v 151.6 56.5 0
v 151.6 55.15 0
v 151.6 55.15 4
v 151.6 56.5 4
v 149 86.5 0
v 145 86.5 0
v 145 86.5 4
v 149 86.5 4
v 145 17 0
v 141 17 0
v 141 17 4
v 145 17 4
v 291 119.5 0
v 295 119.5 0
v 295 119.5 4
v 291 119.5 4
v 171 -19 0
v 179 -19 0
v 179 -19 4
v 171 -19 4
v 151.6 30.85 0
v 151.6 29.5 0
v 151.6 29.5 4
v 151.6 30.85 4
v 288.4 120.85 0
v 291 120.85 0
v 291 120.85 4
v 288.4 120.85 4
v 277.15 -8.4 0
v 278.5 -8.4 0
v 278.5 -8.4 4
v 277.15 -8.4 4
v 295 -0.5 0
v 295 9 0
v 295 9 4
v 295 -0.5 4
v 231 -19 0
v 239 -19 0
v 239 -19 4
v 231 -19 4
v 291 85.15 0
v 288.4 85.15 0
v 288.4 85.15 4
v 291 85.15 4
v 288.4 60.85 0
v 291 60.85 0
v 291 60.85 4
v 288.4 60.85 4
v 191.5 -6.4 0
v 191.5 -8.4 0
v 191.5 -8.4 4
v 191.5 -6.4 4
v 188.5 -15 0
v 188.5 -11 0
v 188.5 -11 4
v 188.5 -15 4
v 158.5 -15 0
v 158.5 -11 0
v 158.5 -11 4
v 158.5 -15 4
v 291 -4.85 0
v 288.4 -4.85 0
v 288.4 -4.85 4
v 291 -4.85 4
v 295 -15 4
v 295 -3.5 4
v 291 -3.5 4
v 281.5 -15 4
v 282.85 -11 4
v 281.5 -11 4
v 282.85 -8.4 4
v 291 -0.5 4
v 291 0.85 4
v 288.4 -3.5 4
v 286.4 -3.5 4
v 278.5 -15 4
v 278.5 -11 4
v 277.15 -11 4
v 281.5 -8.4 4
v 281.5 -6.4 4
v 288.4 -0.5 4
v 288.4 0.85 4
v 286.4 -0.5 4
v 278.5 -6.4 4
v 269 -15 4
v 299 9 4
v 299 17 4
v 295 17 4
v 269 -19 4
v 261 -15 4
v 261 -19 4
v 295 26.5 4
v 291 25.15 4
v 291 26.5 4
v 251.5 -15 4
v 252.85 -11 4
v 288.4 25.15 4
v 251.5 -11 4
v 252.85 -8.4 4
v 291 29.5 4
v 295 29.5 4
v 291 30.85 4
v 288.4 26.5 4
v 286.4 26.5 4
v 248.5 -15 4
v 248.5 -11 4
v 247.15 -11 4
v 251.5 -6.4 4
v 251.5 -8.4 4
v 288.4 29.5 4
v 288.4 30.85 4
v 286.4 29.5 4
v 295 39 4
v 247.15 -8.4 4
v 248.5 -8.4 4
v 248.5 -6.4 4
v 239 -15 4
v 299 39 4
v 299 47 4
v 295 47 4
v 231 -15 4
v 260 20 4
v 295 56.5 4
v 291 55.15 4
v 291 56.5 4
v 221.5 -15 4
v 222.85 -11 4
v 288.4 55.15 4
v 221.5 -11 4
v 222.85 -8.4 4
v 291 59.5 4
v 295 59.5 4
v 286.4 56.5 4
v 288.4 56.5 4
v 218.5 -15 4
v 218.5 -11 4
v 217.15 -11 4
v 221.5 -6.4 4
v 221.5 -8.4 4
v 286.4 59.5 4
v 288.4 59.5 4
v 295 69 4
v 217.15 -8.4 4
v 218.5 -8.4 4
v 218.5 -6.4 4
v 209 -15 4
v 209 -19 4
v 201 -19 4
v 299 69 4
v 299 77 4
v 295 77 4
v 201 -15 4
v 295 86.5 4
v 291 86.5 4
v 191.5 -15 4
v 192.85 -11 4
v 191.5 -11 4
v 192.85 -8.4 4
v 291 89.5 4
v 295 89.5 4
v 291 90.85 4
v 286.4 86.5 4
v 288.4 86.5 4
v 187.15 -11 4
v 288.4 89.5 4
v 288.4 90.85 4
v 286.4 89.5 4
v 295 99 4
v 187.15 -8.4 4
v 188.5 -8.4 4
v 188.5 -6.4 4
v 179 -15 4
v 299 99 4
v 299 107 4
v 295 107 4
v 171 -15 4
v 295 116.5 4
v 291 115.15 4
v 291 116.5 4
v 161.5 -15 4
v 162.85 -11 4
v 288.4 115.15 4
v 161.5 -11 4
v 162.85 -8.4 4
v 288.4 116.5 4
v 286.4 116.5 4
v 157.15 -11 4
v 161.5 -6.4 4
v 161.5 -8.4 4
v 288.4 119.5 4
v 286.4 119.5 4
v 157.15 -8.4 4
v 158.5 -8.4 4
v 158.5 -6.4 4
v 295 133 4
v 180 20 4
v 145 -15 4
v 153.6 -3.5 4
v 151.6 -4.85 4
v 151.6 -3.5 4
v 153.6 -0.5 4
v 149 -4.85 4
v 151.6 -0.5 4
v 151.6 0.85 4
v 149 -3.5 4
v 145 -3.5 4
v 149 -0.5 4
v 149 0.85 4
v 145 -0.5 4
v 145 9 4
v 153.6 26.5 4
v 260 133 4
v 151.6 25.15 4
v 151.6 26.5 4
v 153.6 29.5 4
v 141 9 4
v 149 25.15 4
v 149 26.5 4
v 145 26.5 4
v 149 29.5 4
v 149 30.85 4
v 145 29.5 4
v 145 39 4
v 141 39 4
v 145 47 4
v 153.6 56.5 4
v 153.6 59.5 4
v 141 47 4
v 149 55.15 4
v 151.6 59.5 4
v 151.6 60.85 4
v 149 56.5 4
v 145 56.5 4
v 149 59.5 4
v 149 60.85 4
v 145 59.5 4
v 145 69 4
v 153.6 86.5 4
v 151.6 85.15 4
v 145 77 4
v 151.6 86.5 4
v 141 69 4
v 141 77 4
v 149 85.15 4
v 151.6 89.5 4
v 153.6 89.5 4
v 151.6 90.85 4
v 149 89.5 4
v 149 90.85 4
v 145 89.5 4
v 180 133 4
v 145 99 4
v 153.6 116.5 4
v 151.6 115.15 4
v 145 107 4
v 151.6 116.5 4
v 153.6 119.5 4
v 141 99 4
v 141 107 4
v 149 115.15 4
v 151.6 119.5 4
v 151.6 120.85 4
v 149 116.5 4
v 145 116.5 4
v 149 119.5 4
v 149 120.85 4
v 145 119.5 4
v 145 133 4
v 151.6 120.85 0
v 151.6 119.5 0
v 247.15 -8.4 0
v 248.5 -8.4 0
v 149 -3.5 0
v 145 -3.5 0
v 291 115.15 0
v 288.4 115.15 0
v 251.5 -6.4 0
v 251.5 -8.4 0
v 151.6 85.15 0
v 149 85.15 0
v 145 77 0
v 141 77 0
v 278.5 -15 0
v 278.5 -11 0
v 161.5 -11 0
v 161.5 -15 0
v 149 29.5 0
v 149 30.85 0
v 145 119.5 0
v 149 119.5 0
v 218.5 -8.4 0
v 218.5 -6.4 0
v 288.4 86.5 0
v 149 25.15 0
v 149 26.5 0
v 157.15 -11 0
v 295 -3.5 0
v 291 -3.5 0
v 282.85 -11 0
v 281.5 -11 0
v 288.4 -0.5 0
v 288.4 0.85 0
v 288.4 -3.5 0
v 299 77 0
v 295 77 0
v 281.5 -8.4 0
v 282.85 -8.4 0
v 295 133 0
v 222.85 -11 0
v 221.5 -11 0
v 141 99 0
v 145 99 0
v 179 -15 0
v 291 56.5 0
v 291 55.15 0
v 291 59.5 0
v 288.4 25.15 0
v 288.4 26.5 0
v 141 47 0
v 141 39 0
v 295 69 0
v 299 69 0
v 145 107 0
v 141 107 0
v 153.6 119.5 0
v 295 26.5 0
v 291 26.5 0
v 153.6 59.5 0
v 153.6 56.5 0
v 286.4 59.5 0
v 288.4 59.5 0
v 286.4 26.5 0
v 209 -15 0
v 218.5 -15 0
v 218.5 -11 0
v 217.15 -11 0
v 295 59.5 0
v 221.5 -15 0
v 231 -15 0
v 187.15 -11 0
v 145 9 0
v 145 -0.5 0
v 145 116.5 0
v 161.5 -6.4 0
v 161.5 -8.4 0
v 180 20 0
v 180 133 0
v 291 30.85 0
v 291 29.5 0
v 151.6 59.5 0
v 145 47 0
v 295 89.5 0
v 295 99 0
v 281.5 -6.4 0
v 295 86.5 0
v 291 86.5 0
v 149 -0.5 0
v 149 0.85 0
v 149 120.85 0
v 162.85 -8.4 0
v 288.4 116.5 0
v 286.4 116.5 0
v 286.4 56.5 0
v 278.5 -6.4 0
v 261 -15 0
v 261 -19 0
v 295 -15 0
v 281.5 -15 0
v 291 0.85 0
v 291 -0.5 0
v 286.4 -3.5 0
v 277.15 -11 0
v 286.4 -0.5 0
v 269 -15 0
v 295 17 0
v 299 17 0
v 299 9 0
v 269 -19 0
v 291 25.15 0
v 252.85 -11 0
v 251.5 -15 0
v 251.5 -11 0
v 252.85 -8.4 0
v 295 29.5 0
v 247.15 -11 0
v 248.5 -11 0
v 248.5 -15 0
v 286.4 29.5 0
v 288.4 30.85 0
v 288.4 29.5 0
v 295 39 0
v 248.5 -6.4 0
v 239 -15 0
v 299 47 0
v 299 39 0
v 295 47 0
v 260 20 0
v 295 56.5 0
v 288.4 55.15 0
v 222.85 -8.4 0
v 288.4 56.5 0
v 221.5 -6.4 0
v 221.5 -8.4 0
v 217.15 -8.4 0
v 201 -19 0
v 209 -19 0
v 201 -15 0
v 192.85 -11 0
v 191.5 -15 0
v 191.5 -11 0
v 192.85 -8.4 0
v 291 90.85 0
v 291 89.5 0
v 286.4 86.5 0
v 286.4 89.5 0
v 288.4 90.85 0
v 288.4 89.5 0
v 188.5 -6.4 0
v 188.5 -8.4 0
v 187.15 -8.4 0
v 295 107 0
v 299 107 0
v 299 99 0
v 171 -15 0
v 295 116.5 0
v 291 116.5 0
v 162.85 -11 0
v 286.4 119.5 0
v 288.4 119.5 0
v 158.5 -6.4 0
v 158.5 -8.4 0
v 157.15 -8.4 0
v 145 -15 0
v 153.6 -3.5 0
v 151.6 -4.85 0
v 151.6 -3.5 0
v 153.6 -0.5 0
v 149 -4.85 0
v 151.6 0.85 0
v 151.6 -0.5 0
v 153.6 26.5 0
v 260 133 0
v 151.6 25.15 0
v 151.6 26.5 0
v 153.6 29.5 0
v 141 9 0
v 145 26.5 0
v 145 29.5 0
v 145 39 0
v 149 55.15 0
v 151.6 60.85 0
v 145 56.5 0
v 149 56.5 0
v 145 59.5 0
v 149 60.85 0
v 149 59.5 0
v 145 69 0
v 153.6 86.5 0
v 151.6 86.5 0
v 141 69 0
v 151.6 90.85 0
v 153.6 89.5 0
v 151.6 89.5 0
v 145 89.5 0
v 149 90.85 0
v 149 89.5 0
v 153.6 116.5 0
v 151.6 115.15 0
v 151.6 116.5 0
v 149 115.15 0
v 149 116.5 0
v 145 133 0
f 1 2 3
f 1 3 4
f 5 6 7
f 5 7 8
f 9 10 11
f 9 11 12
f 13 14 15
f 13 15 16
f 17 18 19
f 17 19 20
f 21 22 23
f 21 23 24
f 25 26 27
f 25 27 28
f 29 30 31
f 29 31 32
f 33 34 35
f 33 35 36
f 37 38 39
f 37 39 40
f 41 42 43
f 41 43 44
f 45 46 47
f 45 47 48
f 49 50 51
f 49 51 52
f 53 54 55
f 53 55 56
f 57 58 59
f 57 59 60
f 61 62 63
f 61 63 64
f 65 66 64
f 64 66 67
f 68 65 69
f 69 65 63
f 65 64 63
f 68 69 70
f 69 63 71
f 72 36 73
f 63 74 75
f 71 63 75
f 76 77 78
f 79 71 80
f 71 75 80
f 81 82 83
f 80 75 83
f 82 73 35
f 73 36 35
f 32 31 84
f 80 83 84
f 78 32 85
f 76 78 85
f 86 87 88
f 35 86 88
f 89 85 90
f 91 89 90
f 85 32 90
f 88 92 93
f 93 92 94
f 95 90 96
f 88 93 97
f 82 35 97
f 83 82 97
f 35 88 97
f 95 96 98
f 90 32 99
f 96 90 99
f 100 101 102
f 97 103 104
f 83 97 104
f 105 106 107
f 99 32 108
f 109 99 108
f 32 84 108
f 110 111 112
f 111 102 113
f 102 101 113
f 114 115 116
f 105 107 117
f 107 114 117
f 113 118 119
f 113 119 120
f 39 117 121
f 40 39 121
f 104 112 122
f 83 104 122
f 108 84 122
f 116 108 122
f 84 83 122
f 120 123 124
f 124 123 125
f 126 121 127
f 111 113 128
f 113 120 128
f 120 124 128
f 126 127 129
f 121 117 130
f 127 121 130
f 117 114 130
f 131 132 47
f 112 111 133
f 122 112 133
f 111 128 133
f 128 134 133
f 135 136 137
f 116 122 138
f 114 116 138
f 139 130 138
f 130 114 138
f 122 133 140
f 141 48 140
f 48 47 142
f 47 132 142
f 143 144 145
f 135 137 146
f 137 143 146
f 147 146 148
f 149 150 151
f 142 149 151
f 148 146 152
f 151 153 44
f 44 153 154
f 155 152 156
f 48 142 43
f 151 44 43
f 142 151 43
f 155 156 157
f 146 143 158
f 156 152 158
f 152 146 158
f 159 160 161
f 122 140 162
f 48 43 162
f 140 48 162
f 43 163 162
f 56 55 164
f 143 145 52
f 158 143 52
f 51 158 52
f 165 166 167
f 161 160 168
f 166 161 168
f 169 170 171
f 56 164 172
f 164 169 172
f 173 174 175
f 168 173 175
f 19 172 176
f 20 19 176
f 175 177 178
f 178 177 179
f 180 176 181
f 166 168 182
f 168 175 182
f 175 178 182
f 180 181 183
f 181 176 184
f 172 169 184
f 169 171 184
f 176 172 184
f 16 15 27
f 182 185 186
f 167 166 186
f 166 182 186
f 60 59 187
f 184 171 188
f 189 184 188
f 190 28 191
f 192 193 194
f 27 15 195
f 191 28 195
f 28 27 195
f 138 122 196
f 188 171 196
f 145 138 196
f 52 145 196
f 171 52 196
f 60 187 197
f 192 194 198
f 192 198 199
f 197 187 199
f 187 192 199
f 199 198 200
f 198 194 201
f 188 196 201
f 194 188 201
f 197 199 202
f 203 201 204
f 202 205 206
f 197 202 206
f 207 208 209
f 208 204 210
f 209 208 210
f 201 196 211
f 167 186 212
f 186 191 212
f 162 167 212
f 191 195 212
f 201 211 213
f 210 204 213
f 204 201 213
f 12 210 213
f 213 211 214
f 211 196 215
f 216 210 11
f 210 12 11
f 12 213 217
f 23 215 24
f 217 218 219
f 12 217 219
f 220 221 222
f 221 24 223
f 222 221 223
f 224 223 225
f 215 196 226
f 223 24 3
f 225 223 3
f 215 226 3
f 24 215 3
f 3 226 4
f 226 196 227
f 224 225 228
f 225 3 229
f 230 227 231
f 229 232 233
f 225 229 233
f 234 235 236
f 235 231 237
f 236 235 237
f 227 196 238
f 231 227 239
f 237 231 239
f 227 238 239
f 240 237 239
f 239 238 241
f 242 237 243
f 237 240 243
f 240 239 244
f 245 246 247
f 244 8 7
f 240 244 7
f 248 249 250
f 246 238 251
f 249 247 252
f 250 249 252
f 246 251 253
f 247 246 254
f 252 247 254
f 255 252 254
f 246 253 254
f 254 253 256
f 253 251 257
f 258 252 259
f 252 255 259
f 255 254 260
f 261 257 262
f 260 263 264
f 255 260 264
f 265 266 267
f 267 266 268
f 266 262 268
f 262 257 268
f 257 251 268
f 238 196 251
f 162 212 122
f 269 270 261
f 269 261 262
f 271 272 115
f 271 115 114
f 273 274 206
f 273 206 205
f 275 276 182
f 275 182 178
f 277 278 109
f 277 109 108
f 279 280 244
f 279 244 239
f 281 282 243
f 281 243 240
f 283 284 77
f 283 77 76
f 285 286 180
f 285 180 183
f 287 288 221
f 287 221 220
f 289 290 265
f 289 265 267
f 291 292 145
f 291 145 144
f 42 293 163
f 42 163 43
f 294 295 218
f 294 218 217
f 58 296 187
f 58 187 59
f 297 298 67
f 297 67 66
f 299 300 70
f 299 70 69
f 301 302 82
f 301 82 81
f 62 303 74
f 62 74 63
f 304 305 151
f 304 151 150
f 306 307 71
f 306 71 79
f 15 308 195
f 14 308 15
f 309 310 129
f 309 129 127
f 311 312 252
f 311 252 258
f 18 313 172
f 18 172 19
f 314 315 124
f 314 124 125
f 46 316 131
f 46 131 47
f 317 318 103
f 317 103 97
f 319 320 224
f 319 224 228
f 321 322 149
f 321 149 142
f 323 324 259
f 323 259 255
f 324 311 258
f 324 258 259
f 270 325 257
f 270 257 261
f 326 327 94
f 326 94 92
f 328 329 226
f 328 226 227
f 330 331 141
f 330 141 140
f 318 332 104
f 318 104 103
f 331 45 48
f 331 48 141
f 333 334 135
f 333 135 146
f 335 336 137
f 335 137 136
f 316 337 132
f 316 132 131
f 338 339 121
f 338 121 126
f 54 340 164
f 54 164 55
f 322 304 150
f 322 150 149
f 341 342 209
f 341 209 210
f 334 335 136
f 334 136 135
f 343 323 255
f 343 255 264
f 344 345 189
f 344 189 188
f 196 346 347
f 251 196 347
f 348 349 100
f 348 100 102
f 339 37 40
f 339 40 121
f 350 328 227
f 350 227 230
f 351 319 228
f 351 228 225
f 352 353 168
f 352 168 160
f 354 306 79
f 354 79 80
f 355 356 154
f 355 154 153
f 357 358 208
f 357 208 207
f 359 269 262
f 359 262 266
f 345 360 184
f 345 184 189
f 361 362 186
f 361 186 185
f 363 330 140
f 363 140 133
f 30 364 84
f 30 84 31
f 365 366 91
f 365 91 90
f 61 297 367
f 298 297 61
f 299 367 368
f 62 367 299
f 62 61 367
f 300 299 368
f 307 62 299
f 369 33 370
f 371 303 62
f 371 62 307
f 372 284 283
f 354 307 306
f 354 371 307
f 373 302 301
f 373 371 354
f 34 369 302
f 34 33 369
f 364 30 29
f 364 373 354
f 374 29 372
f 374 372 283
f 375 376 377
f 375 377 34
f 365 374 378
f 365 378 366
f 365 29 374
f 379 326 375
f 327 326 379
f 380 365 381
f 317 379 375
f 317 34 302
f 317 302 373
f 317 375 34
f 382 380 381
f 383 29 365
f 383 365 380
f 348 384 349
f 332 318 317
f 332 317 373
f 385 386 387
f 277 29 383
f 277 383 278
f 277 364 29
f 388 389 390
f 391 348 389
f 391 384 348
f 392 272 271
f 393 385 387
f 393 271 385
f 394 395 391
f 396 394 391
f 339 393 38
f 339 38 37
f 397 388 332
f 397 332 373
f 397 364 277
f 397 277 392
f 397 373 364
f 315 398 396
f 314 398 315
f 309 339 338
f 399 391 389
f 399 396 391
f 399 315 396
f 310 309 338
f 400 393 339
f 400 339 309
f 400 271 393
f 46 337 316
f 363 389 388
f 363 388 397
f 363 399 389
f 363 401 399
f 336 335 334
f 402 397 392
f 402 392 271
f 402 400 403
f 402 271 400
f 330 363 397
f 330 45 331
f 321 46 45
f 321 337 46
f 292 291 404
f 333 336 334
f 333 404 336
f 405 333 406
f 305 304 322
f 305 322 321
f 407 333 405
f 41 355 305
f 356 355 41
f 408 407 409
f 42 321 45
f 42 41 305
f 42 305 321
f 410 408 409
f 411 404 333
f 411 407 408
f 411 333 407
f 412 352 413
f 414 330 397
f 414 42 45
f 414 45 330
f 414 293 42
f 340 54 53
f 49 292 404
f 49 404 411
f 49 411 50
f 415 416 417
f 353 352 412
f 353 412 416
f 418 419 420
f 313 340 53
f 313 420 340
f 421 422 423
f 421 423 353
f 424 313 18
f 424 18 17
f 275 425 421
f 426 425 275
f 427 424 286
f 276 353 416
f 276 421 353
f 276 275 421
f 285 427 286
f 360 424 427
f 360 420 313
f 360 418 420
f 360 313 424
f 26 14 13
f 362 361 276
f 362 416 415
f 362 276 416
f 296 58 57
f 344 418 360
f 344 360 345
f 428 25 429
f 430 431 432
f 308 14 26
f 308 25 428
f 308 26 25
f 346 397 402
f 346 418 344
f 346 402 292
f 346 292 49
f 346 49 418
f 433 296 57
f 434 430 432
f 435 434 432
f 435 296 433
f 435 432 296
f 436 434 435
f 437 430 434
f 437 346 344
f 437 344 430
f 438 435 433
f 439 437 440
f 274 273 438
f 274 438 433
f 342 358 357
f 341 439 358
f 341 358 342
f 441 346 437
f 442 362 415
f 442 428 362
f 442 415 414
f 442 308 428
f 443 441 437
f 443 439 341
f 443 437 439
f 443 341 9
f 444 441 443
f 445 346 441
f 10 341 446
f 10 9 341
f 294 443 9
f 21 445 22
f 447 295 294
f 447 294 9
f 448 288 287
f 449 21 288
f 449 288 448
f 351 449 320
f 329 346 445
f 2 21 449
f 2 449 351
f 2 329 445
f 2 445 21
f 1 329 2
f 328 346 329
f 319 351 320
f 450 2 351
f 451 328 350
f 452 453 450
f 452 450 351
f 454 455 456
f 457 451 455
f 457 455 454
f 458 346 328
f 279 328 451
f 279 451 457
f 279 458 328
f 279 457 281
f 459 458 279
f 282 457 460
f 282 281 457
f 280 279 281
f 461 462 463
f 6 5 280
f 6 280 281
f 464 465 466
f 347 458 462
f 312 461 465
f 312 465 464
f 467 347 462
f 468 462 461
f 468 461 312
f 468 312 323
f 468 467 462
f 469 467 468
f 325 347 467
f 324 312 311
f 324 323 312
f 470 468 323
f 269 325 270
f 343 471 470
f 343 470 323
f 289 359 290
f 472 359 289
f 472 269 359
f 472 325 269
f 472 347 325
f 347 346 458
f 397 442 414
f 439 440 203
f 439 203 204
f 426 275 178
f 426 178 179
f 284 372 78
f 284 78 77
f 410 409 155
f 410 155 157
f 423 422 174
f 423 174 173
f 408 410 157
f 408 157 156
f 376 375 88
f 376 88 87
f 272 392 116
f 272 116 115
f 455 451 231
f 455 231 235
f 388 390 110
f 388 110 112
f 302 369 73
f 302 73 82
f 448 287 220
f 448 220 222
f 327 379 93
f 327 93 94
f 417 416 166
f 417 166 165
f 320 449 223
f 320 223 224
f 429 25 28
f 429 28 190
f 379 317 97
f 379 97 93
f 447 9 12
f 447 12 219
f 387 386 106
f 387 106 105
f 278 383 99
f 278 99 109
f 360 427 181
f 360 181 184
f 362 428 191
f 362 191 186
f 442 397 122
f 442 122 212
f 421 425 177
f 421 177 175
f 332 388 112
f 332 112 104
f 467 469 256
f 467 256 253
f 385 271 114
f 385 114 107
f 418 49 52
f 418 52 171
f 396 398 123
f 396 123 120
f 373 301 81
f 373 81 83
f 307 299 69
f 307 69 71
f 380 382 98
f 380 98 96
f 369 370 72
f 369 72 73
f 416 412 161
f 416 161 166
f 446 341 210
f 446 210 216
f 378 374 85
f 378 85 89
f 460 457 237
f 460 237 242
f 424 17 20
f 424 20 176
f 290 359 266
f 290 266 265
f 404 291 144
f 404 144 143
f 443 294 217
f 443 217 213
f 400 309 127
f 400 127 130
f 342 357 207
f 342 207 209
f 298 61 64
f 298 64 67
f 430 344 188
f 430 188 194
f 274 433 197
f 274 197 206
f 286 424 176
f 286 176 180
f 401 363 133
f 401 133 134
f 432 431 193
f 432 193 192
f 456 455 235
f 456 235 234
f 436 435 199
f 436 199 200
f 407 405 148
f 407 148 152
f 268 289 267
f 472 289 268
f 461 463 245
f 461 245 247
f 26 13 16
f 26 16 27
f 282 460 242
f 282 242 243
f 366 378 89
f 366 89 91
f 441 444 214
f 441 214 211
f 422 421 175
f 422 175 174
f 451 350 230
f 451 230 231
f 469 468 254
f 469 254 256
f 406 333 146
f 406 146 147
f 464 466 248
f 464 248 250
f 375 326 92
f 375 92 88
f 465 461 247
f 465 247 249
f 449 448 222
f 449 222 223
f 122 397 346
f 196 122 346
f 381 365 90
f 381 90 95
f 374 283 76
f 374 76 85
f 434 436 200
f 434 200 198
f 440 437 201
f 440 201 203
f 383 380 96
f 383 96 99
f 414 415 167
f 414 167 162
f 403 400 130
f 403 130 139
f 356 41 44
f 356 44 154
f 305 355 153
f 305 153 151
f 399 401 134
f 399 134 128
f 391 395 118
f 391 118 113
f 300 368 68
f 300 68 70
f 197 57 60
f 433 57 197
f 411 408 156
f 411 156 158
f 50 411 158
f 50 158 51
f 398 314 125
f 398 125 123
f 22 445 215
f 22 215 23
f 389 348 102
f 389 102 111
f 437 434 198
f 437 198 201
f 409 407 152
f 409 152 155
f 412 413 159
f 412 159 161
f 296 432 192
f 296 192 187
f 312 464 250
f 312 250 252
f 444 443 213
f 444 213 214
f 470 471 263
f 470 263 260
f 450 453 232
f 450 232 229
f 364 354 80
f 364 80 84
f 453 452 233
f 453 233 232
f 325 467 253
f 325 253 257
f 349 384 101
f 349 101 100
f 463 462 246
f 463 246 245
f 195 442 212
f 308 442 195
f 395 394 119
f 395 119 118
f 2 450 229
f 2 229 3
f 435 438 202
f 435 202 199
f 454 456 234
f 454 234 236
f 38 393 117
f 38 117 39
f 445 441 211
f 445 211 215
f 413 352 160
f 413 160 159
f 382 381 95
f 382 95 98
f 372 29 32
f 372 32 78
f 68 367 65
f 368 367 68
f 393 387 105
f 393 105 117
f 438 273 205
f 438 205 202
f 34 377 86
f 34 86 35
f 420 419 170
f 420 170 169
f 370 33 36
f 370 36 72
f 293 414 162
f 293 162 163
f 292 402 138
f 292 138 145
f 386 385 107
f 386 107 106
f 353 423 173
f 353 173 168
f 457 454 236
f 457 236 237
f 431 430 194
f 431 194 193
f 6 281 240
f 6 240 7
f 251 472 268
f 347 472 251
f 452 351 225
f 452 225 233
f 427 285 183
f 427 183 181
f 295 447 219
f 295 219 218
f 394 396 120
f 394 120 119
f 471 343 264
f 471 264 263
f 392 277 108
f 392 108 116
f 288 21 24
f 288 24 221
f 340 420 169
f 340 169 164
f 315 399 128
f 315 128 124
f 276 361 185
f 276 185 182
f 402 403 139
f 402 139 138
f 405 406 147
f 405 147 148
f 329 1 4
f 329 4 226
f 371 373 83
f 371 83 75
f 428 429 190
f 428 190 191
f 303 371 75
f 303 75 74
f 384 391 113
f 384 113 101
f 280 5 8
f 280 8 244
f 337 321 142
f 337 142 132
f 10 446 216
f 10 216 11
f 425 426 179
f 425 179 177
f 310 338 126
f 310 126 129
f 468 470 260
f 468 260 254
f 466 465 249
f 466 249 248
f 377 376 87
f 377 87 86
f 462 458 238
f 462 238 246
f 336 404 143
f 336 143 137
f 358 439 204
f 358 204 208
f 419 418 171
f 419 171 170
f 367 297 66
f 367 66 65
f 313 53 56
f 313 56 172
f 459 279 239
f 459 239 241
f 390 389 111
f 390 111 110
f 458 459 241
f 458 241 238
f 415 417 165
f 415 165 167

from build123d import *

# Parameters (mm, degrees)
EXTRUDE_1_DEPTH     = 4
SKETCH_4_W          = 80
SKETCH_4_H          = 113
CUT_EXTRUDE_1_DEPTH = 4


with BuildPart() as part:
    # 草图1 → 凸台-拉伸1 (new body)
    with BuildSketch(Plane.XY):
        Polygon((145, 56.5), (149, 56.5), (149, 55.15), (151.6, 55.15), (151.6, 56.5), (153.6, 56.5), (153.6, 59.5), (151.6, 59.5), (151.6, 60.85), (149, 60.85), (149, 59.5), (145, 59.5), (145, 69), (141, 69), (141, 77), (145, 77), (145, 86.5), (149, 86.5), (149, 85.15), (151.6, 85.15), (151.6, 86.5), (153.6, 86.5), (153.6, 89.5), (151.6, 89.5), (151.6, 90.85), (149, 90.85), (149, 89.5), (145, 89.5), (145, 99), (141, 99), (141, 107), (145, 107), (145, 116.5), (149, 116.5), (149, 115.15), (151.6, 115.15), (151.6, 116.5), (153.6, 116.5), (153.6, 119.5), (151.6, 119.5), (151.6, 120.85), (149, 120.85), (149, 119.5), (145, 119.5), (145, 133), (295, 133), (295, 119.5), (291, 119.5), (291, 120.85), (288.4, 120.85), (288.4, 119.5), (286.4, 119.5), (286.4, 116.5), (288.4, 116.5), (288.4, 115.15), (291, 115.15), (291, 116.5), (295, 116.5), (295, 107), (299, 107), (299, 99), (295, 99), (295, 89.5), (291, 89.5), (291, 90.85), (288.4, 90.85), (288.4, 89.5), (286.4, 89.5), (286.4, 86.5), (288.4, 86.5), (288.4, 85.15), (291, 85.15), (291, 86.5), (295, 86.5), (295, 77), (299, 77), (299, 69), (295, 69), (295, 59.5), (291, 59.5), (291, 60.85), (288.4, 60.85), (288.4, 59.5), (286.4, 59.5), (286.4, 56.5), (288.4, 56.5), (288.4, 55.15), (291, 55.15), (291, 56.5), (295, 56.5), (295, 47), (299, 47), (299, 39), (295, 39), (295, 29.5), (291, 29.5), (291, 30.85), (288.4, 30.85), (288.4, 29.5), (286.4, 29.5), (286.4, 26.5), (288.4, 26.5), (288.4, 25.15), (291, 25.15), (291, 26.5), (295, 26.5), (295, 17), (299, 17), (299, 9), (295, 9), (295, -0.5), (291, -0.5), (291, 0.85), (288.4, 0.85), (288.4, -0.5), (286.4, -0.5), (286.4, -3.5), (288.4, -3.5), (288.4, -4.85), (291, -4.85), (291, -3.5), (295, -3.5), (295, -15), (281.5, -15), (281.5, -11), (282.85, -11), (282.85, -8.4), (281.5, -8.4), (281.5, -6.4), (278.5, -6.4), (278.5, -8.4), (277.15, -8.4), (277.15, -11), (278.5, -11), (278.5, -15), (269, -15), (269, -19), (261, -19), (261, -15), (251.5, -15), (251.5, -11), (252.85, -11), (252.85, -8.4), (251.5, -8.4), (251.5, -6.4), (248.5, -6.4), (248.5, -8.4), (247.15, -8.4), (247.15, -11), (248.5, -11), (248.5, -15), (239, -15), (239, -19), (231, -19), (231, -15), (221.5, -15), (221.5, -11), (222.85, -11), (222.85, -8.4), (221.5, -8.4), (221.5, -6.4), (218.5, -6.4), (218.5, -8.4), (217.15, -8.4), (217.15, -11), (218.5, -11), (218.5, -15), (209, -15), (209, -19), (201, -19), (201, -15), (191.5, -15), (191.5, -11), (192.85, -11), (192.85, -8.4), (191.5, -8.4), (191.5, -6.4), (188.5, -6.4), (188.5, -8.4), (187.15, -8.4), (187.15, -11), (188.5, -11), (188.5, -15), (179, -15), (179, -19), (171, -19), (171, -15), (161.5, -15), (161.5, -11), (162.85, -11), (162.85, -8.4), (161.5, -8.4), (161.5, -6.4), (158.5, -6.4), (158.5, -8.4), (157.15, -8.4), (157.15, -11), (158.5, -11), (158.5, -15), (145, -15), (145, -3.5), (149, -3.5), (149, -4.85), (151.6, -4.85), (151.6, -3.5), (153.6, -3.5), (153.6, -0.5), (151.6, -0.5), (151.6, 0.85), (149, 0.85), (149, -0.5), (145, -0.5), (145, 9), (141, 9), (141, 17), (145, 17), (145, 26.5), (149, 26.5), (149, 25.15), (151.6, 25.15), (151.6, 26.5), (153.6, 26.5), (153.6, 29.5), (151.6, 29.5), (151.6, 30.85), (149, 30.85), (149, 29.5), (145, 29.5), (145, 39), (141, 39), (141, 47), (145, 47), align=None)
    extrude(amount=EXTRUDE_1_DEPTH)

    # 草图4 → 切除-拉伸1 (cut)
    with BuildSketch(Plane(origin=(0, 0, 0), x_dir=(-1, 0, 0), z_dir=(0, 0, -1))):
        with Locations((-220, 76.5)):
            Rectangle(SKETCH_4_W, SKETCH_4_H)
    extrude(amount=-CUT_EXTRUDE_1_DEPTH, mode=Mode.SUBTRACT)


solid = part.part
